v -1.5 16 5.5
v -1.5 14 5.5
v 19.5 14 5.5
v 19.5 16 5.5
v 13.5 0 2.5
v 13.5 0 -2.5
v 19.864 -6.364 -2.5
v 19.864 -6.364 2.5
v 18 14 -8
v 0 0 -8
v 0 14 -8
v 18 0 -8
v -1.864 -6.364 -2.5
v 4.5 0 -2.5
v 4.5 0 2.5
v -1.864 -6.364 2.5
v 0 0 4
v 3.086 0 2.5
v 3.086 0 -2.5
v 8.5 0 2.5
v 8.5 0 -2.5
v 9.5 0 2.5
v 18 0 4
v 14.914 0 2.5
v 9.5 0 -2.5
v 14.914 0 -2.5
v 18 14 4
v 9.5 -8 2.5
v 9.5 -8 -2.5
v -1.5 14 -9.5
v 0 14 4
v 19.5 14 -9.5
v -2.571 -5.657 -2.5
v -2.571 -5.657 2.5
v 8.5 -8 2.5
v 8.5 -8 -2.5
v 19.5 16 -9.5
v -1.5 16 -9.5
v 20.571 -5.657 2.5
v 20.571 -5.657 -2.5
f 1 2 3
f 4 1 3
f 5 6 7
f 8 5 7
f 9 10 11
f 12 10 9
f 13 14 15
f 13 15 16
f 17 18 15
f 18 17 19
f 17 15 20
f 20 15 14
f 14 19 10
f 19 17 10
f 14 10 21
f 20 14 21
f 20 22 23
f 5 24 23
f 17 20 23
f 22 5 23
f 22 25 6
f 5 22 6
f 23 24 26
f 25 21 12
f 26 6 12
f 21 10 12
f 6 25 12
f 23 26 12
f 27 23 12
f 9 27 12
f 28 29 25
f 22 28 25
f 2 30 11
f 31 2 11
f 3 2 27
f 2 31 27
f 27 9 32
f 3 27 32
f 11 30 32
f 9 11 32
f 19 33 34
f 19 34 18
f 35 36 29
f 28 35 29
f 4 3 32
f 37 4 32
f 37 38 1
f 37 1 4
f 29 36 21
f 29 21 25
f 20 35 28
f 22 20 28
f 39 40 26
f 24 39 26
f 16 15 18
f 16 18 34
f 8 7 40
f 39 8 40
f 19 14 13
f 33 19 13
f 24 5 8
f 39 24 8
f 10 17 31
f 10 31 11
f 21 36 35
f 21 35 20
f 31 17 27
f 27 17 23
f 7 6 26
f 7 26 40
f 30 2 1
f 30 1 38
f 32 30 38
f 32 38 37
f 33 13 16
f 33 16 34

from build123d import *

# Parameters (mm, degrees)
SKETCH1_W                = 18
SKETCH1_H                = 12
BOSS_EXTRUDE1_DEPTH      = 14
SKETCH2_W                = 21
SKETCH2_H                = 15
BOSS_EXTRUDE2_DEPTH      = 2
BOSS_EXTRUDE3_DEPTH      = 2.5
BOSS_EXTRUDE3_DEPTH_BACK = 2.5
SKETCH3_W                = 1
SKETCH3_H                = 8


with BuildPart() as part:
    # Sketch1 → Boss-Extrude1 (new body)
    with BuildSketch(Plane(origin=(0, 0, 0), x_dir=(1, 0, 0), z_dir=(0, 1, 0))):
        with Locations((9, 2)):
            Rectangle(SKETCH1_W, SKETCH1_H)
    extrude(amount=BOSS_EXTRUDE1_DEPTH)

    # Sketch2 → Boss-Extrude2 (add)
    with BuildSketch(Plane(origin=(0, 14, 0), x_dir=(1, 0, 0), z_dir=(0, 1, 0))):
        with Locations((9, 2)):
            Rectangle(SKETCH2_W, SKETCH2_H)
    extrude(amount=BOSS_EXTRUDE2_DEPTH)

    # Sketch3 → Boss-Extrude3 (add, two sides: drawn at the far end of the back side and taken through both)
    with BuildSketch(Plane.XY.offset(-BOSS_EXTRUDE3_DEPTH_BACK)):
        with Locations((9, -4)):
            Rectangle(SKETCH3_W, SKETCH3_H)
        Polygon((13.5, 0), (19.863961031, -6.363961031), (20.571067812, -5.656854249), (14.914213562, 0), align=None)
        Polygon((3.085786438, 0), (4.5, 0), (-1.863961031, -6.363961031), (-2.571067812, -5.656854249), align=None)
    extrude(amount=BOSS_EXTRUDE3_DEPTH + BOSS_EXTRUDE3_DEPTH_BACK)


solid = part.part
